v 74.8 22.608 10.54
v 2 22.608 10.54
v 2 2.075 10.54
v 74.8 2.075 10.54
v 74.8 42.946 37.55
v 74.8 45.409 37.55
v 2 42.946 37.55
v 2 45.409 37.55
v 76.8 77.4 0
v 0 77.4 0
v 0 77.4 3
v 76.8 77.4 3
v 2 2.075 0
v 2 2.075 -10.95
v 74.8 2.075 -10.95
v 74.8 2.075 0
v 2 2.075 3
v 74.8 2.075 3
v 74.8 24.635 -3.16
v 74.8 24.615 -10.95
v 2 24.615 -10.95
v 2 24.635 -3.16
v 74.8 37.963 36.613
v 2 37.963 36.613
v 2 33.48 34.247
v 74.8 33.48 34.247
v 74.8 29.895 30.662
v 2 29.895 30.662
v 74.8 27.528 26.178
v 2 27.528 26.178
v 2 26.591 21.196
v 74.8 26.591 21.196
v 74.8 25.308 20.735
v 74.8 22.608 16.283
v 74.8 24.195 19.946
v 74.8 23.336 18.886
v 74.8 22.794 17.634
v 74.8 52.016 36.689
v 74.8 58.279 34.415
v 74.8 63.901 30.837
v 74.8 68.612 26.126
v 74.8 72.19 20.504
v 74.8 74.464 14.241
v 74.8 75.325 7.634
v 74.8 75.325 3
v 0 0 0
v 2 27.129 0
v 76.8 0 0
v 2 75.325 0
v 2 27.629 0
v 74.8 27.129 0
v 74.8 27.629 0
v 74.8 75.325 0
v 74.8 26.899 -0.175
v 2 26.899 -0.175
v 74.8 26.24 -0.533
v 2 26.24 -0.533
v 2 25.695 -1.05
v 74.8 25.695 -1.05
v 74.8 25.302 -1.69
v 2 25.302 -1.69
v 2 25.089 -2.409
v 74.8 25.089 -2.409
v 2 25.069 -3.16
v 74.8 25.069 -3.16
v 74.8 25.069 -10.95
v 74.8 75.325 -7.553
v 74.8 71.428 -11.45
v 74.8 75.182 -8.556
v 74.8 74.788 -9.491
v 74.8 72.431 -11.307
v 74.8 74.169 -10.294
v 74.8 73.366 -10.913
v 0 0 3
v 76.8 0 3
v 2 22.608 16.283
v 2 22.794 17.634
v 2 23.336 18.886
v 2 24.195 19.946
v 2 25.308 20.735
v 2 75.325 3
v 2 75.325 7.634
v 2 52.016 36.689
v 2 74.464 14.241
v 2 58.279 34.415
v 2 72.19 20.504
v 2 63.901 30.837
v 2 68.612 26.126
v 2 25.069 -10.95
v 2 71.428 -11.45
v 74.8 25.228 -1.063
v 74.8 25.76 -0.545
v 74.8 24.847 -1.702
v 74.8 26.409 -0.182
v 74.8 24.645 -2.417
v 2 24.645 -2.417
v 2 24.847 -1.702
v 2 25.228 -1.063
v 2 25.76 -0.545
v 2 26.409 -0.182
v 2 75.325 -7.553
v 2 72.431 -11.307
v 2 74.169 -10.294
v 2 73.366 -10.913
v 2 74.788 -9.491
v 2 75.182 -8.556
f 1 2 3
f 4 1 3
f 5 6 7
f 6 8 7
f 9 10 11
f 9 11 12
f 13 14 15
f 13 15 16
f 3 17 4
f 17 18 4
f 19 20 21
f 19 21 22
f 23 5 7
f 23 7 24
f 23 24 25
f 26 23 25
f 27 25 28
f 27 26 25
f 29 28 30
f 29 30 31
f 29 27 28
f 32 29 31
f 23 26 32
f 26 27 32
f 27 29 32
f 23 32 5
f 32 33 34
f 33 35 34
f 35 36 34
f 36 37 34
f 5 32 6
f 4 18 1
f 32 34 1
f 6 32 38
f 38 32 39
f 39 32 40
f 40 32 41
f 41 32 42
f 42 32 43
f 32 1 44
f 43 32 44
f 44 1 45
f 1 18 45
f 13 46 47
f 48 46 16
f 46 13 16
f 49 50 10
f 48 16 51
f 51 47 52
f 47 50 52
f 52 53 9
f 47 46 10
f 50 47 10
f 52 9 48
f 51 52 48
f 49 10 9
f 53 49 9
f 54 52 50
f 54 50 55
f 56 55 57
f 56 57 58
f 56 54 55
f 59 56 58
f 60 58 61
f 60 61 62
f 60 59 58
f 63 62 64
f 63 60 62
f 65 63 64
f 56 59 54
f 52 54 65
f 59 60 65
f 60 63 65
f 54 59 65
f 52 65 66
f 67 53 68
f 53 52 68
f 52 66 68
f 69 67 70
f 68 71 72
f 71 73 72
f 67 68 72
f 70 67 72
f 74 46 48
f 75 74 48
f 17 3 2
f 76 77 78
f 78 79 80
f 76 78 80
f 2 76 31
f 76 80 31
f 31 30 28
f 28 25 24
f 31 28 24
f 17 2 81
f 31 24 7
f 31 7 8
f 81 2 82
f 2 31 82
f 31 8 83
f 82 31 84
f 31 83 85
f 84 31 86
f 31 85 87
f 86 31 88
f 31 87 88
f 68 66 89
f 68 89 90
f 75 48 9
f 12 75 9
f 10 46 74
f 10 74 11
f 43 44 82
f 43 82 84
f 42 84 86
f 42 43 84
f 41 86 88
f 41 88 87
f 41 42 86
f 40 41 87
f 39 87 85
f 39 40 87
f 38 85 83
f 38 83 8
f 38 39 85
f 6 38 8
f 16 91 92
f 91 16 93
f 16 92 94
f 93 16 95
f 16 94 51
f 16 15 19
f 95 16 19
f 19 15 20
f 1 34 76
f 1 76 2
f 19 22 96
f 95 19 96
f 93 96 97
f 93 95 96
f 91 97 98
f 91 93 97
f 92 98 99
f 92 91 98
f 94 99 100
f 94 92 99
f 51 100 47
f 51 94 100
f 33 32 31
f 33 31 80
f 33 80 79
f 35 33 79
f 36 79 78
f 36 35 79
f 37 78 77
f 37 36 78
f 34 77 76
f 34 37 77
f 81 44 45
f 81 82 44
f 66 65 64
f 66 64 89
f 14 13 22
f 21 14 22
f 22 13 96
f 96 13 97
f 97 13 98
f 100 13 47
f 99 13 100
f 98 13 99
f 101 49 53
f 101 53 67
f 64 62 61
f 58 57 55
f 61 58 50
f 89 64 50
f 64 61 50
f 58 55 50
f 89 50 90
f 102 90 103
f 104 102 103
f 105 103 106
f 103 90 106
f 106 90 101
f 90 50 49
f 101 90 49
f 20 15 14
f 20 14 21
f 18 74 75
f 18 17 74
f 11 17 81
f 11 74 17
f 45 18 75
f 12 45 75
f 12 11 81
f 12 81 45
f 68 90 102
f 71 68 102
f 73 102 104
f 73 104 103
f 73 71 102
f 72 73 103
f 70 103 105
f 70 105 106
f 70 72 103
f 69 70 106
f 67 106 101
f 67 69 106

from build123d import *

# Parameters (mm, degrees)
SKETCH1_W                       = 76.8
SKETCH1_H                       = 77.4
SKETCH1_W_2                     = 72.8
SKETCH1_H_2                     = 73.25
BOSS_EXTRUDE1_DEPTH             = 3
BOSS_EXTRUDE2_REACH             = 88.454
BOSS_EXTRUDE2_DIRECTION_2_REACH = 88.454
CUT_EXTRUDE1_DEPTH              = 36.5
CUT_EXTRUDE1_DEPTH_BACK         = 36.5


with BuildPart() as part:
    # Sketch1 → Boss-Extrude1 (new body)
    with BuildSketch(Plane.XY):
        with Locations((38.4, 38.7)):
            Rectangle(SKETCH1_W, SKETCH1_H)
        with Locations((38.4, 38.7)):
            Rectangle(SKETCH1_W_2, SKETCH1_H_2, mode=Mode.SUBTRACT)
    extrude(amount=BOSS_EXTRUDE1_DEPTH)

    # Boss-Extrude2: up to this face of the body (flat: up to its plane)
    boss_extrude2_end = Plane(part.part.faces().sort_by_distance((2, 38.7, 1.5))[0])
    # Sketch3 → Boss-Extrude2 (add, up to the picked face)
    with BuildSketch(Plane.ZY.offset(-38.4), mode=Mode.PRIVATE) as boss_extrude2_sk1:
        Polygon((3, 75.325), (37.55, 75.325), (37.55, 2.075), (3, 2.075), (-11.45, 2.075), (-11.45, 75.325), align=None)
    boss_extrude2_tool1 = split(extrude(boss_extrude2_sk1.sketch, amount=BOSS_EXTRUDE2_REACH, mode=Mode.PRIVATE), bisect_by=boss_extrude2_end, keep=Keep.BOTH, mode=Mode.PRIVATE)
    add(boss_extrude2_tool1.solids().sort_by(Axis((38.4, 38.7, 13.05), (-1, 0, 0)))[0])

    # Boss-Extrude2 direction 2: up to this face of the body (flat: up to its plane)
    boss_extrude2_direction_2_end = Plane(part.part.faces().sort_by_distance((74.8, 38.7, 1.5))[0])
    # Sketch3 → Boss-Extrude2 direction 2 (add, up to the picked face)
    with BuildSketch(Plane.ZY.offset(-38.4), mode=Mode.PRIVATE) as boss_extrude2_direction_2_sk1:
        Polygon((3, 75.325), (37.55, 75.325), (37.55, 2.075), (3, 2.075), (-11.45, 2.075), (-11.45, 75.325), align=None)
    boss_extrude2_direction_2_tool1 = split(extrude(boss_extrude2_direction_2_sk1.sketch, amount=-BOSS_EXTRUDE2_DIRECTION_2_REACH, mode=Mode.PRIVATE), bisect_by=boss_extrude2_direction_2_end, keep=Keep.BOTH, mode=Mode.PRIVATE)
    add(boss_extrude2_direction_2_tool1.solids().sort_by(Axis((38.4, 38.7, 13.05), (1, 0, 0)))[0])

    # Sketch4 → Cut-Extrude1 (cut, two sides: drawn at the far end of the back side and taken through both)
    with BuildSketch(Plane.ZY.offset(-38.4).offset(-CUT_EXTRUDE1_DEPTH_BACK)):
        with BuildLine():
            Line((-10.95, 25.069274624), (-11.45, 71.427579202))
            Line((-11.45, 71.427579202), (-11.45, 2.075))
            Line((-11.45, 2.075), (-10.95, 2.075))
            Line((-10.95, 2.075), (-10.95, 24.615051172))
            Line((-10.95, 24.615051172), (-3.159893594, 24.634539463))
            ThreePointArc((-3.159893594, 24.634539463), (-1.063252525, 25.227514391), (0, 27.129360101))
            Line((0, 27.129360101), (0, 27.629360101))
            ThreePointArc((0, 27.629360101), (-1.049735735, 25.694881971), (-3.159893594, 25.069274624))
            Line((-3.159893594, 25.069274624), (-10.95, 25.069274624))
        make_face()
        with BuildLine():
            ThreePointArc((-7.449766555, 75.325), (-7.501172879, 75.325334593), (-7.552579202, 75.325))
            Line((-7.552579202, 75.325), (-7.449766555, 75.325))
        make_face()
        with BuildLine():
            Line((-11.45, 75.325), (-11.45, 71.427579202))
            ThreePointArc((-11.45, 71.427579202), (-10.293651907, 74.168651907), (-7.552579202, 75.325))
            Line((-7.552579202, 75.325), (-11.45, 75.325))
        make_face()
        with BuildLine():
            ThreePointArc((21.195514184, 26.59148761), (19.445162982, 23.729233412), (16.282917728, 22.60832602))
            Line((16.282917728, 22.60832602), (10.540023281, 22.60832602))
            Line((10.540023281, 22.60832602), (10.540023281, 2.075))
            Line((10.540023281, 2.075), (37.55, 2.075))
            Line((37.55, 2.075), (37.55, 42.945973427))
            ThreePointArc((37.55, 42.945973427), (32.588948731, 31.55253888), (21.195514184, 26.59148761))
        make_face()
        with BuildLine():
            ThreePointArc((7.633980307, 75.325), (28.610259758, 66.385259758), (37.55, 45.408980307))
            Line((37.55, 45.408980307), (37.55, 75.325))
            Line((37.55, 75.325), (7.633980307, 75.325))
        make_face()
        with BuildLine():
            Line((37.55, 45.408980307), (37.55, 44.16612845))
            ThreePointArc((37.55, 44.16612845), (37.556322242, 44.787554379), (37.55, 45.408980307))
        make_face()
        with BuildLine():
            Line((37.55, 44.16612845), (37.55, 42.945973427))
            ThreePointArc((37.55, 42.945973427), (37.560966221, 43.556050938), (37.55, 44.16612845))
        make_face()
    extrude(amount=CUT_EXTRUDE1_DEPTH + CUT_EXTRUDE1_DEPTH_BACK, mode=Mode.SUBTRACT)


solid = part.part
